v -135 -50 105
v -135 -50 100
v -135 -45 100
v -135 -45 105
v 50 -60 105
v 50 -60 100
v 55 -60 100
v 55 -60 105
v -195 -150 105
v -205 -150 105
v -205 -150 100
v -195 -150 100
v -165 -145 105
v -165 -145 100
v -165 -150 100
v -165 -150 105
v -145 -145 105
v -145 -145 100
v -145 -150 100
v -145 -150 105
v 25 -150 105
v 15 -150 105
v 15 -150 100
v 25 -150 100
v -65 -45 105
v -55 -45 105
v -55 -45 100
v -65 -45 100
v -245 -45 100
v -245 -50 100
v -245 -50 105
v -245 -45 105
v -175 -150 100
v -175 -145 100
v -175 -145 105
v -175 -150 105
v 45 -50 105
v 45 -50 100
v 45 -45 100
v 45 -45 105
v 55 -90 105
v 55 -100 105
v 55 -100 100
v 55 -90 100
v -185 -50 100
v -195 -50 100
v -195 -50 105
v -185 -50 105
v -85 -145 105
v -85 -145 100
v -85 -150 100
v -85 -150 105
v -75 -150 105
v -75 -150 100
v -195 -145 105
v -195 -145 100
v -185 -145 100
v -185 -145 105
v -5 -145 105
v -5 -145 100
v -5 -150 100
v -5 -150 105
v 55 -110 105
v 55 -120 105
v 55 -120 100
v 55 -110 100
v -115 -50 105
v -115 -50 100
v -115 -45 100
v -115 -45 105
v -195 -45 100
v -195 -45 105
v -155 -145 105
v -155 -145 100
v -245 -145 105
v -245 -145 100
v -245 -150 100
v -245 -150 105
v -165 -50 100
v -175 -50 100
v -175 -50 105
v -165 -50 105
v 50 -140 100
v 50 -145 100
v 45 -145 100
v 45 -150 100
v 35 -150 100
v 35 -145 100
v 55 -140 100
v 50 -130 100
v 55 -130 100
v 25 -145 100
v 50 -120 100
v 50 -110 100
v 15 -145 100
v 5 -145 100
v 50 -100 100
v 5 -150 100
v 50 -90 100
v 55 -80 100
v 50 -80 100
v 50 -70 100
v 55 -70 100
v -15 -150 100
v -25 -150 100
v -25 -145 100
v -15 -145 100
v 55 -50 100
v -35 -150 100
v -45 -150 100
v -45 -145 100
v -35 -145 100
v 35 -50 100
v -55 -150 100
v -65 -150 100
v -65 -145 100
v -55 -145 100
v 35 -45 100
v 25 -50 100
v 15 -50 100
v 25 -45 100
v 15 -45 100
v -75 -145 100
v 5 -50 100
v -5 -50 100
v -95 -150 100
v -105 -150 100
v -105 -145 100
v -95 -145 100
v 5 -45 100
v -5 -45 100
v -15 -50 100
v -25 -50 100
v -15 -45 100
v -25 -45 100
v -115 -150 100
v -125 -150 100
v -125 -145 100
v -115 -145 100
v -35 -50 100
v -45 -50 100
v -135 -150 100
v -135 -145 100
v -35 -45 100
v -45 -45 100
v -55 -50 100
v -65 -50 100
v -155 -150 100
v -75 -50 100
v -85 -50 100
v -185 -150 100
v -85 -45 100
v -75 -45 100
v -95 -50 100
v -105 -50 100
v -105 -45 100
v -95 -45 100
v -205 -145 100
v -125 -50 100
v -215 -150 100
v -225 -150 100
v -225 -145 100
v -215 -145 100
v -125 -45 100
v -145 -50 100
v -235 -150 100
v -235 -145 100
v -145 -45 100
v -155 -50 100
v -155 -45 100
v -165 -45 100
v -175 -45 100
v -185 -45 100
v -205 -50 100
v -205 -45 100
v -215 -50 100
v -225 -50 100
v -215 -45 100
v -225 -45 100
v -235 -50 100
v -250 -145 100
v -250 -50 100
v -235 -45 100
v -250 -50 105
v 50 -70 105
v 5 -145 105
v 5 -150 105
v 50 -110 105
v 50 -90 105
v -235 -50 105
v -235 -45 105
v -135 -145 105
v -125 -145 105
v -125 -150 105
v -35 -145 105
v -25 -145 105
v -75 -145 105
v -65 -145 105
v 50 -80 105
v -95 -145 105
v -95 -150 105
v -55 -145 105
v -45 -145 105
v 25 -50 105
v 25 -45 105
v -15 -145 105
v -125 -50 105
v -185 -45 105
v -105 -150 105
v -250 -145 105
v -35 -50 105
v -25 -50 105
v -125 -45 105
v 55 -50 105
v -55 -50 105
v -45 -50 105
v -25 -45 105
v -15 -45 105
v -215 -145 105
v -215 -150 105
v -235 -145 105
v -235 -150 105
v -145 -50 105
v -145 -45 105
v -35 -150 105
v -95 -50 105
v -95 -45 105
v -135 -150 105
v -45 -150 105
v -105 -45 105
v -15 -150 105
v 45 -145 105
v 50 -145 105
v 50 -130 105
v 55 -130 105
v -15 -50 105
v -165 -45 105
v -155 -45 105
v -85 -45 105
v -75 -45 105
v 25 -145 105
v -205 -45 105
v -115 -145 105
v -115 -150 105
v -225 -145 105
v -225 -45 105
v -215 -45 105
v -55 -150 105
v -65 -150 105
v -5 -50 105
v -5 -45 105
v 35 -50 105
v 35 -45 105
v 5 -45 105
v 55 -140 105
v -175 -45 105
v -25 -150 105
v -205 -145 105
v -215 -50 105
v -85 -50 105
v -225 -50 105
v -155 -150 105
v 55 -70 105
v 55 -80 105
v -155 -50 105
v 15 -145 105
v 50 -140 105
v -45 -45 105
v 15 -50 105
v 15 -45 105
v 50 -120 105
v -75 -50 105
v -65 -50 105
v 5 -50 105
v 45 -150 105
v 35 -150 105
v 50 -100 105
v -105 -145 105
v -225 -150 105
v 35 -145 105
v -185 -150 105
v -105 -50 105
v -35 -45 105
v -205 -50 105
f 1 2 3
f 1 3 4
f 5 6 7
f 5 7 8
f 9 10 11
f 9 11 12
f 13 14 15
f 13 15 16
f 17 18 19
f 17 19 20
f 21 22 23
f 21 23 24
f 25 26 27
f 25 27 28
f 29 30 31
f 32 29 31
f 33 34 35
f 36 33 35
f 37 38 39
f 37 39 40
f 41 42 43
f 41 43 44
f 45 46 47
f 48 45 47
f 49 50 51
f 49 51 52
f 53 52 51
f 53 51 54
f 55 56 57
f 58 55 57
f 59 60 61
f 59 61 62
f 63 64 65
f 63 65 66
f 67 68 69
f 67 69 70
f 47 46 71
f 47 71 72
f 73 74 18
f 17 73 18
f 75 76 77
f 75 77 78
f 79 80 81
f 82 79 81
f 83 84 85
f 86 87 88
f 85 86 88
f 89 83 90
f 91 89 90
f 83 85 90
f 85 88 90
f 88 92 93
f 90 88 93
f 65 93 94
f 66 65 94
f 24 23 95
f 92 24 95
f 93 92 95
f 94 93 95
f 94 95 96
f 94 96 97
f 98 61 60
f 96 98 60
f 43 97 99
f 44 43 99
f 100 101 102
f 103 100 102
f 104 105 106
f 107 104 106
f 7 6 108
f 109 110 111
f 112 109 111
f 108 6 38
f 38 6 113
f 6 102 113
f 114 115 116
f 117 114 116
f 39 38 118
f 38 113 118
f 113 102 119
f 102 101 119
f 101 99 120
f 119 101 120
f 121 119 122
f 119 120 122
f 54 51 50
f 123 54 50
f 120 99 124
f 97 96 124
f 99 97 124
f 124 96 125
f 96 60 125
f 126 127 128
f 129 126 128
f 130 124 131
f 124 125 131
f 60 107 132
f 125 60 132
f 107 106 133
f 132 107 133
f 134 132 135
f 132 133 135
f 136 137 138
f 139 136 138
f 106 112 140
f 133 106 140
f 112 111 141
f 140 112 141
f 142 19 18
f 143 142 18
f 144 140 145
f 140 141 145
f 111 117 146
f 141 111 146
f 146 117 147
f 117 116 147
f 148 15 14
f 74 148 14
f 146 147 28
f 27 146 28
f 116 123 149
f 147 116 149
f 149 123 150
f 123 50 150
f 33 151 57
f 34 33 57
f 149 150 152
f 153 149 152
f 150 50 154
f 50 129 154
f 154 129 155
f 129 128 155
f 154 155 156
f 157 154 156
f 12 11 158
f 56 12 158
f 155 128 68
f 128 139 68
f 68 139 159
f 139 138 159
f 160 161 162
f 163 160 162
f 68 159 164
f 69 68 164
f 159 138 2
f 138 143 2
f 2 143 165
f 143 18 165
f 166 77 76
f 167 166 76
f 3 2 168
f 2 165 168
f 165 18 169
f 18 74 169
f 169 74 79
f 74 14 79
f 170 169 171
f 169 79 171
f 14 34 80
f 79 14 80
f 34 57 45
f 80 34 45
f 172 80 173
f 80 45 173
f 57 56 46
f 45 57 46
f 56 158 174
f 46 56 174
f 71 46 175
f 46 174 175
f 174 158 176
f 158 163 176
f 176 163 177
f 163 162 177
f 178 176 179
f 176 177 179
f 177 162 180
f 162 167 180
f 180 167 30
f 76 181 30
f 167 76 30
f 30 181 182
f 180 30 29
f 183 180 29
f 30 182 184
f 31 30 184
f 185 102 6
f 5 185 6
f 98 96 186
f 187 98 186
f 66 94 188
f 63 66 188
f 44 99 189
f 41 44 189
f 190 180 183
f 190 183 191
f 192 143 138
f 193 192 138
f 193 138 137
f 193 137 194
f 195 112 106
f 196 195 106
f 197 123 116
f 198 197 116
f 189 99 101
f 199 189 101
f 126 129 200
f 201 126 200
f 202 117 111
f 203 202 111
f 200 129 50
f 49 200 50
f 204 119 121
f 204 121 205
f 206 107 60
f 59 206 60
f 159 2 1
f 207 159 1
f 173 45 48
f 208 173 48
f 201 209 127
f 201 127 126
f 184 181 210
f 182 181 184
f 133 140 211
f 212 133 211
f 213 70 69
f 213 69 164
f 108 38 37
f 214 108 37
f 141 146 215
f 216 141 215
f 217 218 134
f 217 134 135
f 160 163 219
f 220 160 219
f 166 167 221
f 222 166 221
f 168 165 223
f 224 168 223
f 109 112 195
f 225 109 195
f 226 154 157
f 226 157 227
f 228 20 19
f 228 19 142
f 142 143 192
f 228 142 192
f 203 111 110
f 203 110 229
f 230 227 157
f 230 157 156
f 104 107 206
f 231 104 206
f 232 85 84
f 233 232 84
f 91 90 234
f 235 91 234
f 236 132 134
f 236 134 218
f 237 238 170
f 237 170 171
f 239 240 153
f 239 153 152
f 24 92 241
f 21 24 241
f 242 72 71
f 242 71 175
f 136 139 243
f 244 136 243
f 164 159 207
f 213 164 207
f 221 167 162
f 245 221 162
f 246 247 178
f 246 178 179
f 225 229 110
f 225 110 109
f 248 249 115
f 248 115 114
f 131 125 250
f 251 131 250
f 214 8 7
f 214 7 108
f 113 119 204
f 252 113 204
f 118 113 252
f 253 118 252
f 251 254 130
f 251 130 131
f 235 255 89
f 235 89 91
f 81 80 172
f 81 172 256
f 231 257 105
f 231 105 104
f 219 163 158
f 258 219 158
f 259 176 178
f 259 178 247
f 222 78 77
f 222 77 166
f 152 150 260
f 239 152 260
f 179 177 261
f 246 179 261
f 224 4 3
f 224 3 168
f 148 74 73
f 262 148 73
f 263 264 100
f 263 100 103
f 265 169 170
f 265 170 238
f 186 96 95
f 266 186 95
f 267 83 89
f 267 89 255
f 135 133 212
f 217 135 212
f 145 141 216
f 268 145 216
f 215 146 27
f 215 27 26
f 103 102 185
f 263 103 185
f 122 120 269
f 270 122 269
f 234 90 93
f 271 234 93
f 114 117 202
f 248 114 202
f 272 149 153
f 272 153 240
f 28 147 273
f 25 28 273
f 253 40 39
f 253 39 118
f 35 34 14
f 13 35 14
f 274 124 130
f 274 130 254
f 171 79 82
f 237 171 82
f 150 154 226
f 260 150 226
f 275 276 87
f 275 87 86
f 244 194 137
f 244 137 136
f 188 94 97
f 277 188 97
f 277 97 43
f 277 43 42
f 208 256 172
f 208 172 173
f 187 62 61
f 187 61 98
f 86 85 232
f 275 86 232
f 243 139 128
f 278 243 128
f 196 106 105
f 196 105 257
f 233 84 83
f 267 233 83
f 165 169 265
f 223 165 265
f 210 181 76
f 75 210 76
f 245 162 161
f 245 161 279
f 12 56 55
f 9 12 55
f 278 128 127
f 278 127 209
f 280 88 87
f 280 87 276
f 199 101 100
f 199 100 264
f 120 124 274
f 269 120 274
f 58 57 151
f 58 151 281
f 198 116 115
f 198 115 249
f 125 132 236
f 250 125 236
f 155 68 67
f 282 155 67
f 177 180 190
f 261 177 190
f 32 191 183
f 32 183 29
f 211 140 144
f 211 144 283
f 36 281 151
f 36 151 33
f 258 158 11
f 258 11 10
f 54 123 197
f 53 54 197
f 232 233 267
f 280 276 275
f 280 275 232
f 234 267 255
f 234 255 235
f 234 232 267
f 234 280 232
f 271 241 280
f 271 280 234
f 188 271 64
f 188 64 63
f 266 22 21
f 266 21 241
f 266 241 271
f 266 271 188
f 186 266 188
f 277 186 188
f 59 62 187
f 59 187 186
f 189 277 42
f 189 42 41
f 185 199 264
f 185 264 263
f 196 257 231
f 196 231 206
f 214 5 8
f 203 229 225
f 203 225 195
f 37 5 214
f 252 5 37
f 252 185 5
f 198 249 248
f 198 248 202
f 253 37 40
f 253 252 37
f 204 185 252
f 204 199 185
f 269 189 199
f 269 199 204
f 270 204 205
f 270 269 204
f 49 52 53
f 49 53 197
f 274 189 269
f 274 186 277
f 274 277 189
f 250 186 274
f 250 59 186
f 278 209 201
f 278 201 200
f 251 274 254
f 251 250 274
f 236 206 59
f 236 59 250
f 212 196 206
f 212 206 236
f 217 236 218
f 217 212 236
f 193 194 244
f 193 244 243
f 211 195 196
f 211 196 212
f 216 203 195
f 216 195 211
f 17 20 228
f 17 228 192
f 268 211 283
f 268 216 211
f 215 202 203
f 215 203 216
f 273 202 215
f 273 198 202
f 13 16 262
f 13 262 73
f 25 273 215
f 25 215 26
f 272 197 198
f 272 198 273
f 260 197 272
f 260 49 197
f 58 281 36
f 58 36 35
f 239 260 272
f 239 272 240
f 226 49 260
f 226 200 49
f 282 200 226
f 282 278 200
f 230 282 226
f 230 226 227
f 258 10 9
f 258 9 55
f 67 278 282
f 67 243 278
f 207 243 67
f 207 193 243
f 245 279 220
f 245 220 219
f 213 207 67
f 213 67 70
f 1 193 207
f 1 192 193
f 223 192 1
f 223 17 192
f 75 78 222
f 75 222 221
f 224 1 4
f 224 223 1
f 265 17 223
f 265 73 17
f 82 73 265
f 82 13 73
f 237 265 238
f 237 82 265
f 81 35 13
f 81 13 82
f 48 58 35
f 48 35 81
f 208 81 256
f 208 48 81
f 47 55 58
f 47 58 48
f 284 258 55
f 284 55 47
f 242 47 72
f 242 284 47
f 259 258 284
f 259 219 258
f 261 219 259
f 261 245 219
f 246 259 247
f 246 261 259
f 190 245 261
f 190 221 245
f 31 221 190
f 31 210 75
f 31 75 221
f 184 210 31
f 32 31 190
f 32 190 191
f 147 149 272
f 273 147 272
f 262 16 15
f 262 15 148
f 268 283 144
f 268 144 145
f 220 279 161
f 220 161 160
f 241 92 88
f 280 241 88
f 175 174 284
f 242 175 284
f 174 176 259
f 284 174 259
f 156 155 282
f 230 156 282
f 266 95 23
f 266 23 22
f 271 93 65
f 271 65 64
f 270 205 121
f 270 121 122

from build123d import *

# Parameters (mm, degrees)
SKETCH096_W            = 300
SKETCH096_H            = 95
PAD053_DEPTH           = 5
SKETCH113_W            = 10
SKETCH113_H            = 5
PAD069_DEPTH           = 5
LINEARPATTERN065_COUNT = 5
LINEARPATTERN065_PITCH = 20
SKETCH114_W            = 10
SKETCH114_H            = 5
PAD070_DEPTH           = 5
LINEARPATTERN066_COUNT = 15
LINEARPATTERN066_PITCH = 20
SKETCH129_W            = 10
SKETCH129_H            = 5
PAD073_DEPTH           = 5
LINEARPATTERN081_COUNT = 15
LINEARPATTERN081_PITCH = 20


with BuildPart() as part:
    # Sketch096 → Pad053 (new body)
    with BuildSketch(Plane.XY):
        Rectangle(SKETCH096_W, SKETCH096_H)
    extrude(amount=PAD053_DEPTH)

    # Sketch113 (on DatumPlane) → Pad069 (join)
    with BuildSketch(Plane.YZ.offset(150)):
        with Locations((-37.5, 2.5)):
            Rectangle(SKETCH113_W, SKETCH113_H)
    pad069 = extrude(amount=PAD069_DEPTH)

    # LinearPattern065: Pad069 ×5
    with Locations(*[(0, i * LINEARPATTERN065_PITCH, 0) for i in range(1, LINEARPATTERN065_COUNT)]):
        add(pad069)

    # Sketch114 (on DatumPlane) → Pad070 (join)
    with BuildSketch(Plane.XZ.offset(47.5)):
        with Locations((-140, 2.5)):
            Rectangle(SKETCH114_W, SKETCH114_H)
    pad070 = extrude(amount=PAD070_DEPTH)

    # LinearPattern066: Pad070 ×15
    with Locations(*[(i * LINEARPATTERN066_PITCH, 0, 0) for i in range(1, LINEARPATTERN066_COUNT)]):
        add(pad070)

    # Sketch129 (on DatumPlane) → Pad073 (join)
    with BuildSketch(Plane(origin=(0, 47.5, 0), x_dir=(-1, 0, 0), z_dir=(0, 1, 0))):
        with Locations((-140, 2.5)):
            Rectangle(SKETCH129_W, SKETCH129_H)
    pad073 = extrude(amount=PAD073_DEPTH)

    # LinearPattern081: Pad073 ×15
    with Locations(*[(-i * LINEARPATTERN081_PITCH, 0, 0) for i in range(1, LINEARPATTERN081_COUNT)]):
        add(pad073)


with BuildPart() as part_1:
    # Body037 placement: moved
    add(part.part.moved(Location((-100, -97.5, 100))))


solid = part_1.part
